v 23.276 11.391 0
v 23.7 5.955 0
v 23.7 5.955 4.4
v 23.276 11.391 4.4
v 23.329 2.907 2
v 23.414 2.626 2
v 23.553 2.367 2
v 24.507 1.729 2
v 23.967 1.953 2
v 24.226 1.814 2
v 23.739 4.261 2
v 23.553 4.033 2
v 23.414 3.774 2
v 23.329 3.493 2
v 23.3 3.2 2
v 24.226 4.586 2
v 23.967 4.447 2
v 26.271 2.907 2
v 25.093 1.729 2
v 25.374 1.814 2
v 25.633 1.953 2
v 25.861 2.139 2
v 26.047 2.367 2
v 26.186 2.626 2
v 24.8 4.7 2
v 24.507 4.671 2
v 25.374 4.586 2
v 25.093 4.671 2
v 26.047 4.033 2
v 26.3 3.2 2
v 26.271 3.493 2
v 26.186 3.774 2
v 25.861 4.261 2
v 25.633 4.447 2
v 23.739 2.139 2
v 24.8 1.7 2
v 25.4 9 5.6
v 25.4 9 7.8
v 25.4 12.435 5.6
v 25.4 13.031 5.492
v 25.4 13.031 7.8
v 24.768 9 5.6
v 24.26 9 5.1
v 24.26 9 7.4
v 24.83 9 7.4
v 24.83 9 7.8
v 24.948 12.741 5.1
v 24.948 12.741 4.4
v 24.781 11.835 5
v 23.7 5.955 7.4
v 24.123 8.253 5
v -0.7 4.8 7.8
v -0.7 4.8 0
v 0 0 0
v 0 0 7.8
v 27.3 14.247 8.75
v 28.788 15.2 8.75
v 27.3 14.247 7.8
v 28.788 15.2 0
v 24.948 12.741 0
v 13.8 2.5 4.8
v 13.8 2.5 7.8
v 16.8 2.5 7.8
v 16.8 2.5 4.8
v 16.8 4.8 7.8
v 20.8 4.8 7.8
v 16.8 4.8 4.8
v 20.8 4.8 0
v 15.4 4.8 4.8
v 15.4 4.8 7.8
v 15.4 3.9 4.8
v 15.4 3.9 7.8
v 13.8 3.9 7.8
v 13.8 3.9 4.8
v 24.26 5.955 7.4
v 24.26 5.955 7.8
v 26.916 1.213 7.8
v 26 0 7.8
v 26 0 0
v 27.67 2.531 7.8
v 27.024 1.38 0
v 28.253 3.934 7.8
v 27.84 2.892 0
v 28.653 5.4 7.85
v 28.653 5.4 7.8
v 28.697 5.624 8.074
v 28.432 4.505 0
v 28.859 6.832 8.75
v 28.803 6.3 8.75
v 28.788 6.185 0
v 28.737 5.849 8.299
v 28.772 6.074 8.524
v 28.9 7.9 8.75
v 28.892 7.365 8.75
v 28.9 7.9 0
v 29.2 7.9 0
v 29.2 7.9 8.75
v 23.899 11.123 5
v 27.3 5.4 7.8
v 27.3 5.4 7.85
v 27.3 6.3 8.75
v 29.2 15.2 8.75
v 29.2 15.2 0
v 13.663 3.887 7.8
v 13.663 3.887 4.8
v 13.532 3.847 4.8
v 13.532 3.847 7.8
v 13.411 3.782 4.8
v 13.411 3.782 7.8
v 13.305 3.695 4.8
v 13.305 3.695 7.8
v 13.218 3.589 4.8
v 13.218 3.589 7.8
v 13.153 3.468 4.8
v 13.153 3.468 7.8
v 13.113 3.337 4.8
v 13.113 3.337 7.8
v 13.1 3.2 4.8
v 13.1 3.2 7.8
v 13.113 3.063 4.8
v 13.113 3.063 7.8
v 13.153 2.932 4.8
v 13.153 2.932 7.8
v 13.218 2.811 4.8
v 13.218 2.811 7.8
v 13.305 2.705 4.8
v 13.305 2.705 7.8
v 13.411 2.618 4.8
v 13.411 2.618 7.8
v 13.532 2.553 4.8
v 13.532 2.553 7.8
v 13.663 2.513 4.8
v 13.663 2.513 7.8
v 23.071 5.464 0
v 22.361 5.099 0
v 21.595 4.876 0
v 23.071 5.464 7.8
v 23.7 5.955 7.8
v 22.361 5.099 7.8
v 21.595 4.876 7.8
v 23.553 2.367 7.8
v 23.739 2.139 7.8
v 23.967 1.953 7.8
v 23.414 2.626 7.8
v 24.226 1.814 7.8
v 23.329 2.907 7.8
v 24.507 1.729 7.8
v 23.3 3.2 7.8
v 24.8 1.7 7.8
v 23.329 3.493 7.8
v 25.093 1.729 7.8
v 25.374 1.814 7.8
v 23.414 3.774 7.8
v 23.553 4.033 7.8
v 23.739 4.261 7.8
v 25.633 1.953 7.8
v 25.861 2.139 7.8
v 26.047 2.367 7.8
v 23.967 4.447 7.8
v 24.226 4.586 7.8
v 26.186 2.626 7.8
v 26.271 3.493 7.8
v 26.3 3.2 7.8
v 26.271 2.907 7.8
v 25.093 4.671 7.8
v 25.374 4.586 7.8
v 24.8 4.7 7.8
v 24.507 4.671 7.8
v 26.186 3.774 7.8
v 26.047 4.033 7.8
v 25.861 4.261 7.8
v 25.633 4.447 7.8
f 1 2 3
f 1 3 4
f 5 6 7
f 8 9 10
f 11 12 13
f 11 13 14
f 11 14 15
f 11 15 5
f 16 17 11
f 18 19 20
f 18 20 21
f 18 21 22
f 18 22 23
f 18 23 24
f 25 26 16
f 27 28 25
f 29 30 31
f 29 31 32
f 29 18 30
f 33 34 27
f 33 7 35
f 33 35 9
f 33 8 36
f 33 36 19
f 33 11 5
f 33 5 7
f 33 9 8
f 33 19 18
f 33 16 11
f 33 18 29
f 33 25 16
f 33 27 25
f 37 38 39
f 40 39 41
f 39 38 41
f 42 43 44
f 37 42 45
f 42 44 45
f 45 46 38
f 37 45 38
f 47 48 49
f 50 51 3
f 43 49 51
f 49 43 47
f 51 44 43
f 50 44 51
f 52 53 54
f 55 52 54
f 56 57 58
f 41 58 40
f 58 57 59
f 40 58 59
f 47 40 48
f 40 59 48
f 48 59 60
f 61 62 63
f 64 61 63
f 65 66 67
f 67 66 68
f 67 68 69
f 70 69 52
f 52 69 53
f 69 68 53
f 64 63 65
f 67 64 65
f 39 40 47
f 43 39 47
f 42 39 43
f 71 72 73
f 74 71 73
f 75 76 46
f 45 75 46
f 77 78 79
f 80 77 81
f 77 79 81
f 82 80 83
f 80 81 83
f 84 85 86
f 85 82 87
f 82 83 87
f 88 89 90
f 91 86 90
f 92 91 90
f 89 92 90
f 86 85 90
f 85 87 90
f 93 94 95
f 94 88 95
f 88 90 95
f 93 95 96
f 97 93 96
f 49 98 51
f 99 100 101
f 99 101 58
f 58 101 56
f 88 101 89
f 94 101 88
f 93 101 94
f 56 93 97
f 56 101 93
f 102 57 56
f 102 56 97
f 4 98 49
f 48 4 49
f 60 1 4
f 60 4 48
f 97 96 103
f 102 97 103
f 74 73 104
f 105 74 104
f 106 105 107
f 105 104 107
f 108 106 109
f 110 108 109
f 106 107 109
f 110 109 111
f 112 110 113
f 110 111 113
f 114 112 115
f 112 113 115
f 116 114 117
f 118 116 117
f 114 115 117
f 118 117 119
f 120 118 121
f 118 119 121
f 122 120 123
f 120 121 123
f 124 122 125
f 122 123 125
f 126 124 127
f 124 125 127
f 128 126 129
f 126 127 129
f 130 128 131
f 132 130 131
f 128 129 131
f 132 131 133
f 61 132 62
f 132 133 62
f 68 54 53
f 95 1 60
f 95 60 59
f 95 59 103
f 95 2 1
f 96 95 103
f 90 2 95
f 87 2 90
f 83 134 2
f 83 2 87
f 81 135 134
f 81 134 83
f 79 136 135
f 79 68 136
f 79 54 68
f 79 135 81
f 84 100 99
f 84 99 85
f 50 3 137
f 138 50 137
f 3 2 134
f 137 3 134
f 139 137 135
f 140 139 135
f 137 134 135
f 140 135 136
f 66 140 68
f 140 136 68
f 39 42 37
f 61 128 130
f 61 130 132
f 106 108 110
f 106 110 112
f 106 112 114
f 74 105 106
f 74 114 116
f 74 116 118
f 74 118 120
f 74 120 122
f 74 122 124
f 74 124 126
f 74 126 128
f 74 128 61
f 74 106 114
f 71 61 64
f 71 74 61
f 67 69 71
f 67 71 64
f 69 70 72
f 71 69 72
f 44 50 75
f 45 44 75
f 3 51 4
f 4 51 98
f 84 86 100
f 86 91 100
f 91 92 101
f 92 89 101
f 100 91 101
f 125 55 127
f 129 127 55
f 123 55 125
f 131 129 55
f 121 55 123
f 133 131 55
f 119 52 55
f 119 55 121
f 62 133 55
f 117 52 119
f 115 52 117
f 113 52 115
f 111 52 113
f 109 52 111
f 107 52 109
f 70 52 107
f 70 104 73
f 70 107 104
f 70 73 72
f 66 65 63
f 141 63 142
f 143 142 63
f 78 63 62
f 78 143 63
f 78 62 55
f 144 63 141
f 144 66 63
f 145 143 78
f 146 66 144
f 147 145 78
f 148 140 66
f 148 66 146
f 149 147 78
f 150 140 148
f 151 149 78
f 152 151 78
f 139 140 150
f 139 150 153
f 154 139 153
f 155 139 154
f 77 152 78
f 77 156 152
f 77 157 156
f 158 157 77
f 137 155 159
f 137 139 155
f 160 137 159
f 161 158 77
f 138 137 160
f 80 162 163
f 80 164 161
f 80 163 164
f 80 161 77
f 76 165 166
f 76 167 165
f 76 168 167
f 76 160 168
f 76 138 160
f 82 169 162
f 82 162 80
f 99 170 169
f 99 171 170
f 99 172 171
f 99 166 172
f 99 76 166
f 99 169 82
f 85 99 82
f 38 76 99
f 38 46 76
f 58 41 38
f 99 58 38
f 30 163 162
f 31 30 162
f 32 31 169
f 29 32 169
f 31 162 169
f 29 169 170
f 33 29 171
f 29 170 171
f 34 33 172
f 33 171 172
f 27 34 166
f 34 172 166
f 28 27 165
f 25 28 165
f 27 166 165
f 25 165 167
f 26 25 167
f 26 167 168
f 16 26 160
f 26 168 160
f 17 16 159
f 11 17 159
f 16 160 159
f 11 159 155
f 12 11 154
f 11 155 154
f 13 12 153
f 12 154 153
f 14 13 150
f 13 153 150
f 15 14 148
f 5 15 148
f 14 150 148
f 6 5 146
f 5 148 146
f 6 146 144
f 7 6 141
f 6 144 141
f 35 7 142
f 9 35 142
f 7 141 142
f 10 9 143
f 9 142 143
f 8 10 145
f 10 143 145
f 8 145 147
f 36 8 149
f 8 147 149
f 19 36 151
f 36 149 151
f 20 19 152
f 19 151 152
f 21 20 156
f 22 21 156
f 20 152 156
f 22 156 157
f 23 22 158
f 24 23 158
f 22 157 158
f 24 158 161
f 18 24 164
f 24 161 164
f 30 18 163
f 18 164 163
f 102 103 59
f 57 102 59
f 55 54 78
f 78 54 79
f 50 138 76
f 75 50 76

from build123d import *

# Parameters (mm, degrees)
F1_DEPTH  = 8.9
F2_W      = 28
F2_H      = 24.8338975774
F3_DEPTH  = 1.1
F4_W      = 81.2477835059
F4_H      = 5
F5_DEPTH  = 1.1
F6_R      = 1.5
F7_DEPTH  = 5.8
F8_W      = 8.6927097291
F8_H      = 13.0551015027
F9_DEPTH  = 0.15
F10_SIZE  = 0.9
F12_DEPTH = 3
F13_W     = 2.2015041194
F13_H     = 6.2
F14_DEPTH = 2.2
F15_SIZE  = 0.5
F17_DEPTH = 0.4
F19_DEPTH = 25
F21_DEPTH = 5
F22_SIZE  = 0.6


with BuildPart() as f1:
    # F0 (on Top) → F1 (new body)
    with BuildSketch(Plane.XY):
        with BuildLine():
            Line((-0.7, 4.8), (0, 0))
            Line((0, 0), (26, 0))
            ThreePointArc((26, 0), (28.1652277476, 3.687448042), (28.9, 7.9))
            Line((28.9, 7.9), (29.2, 7.9))
            Line((29.2, 7.9), (29.2, 15.2))
            Line((29.2, 15.2), (25.4, 15.2))
            Line((25.4, 15.2), (23.7, 5.9550013521))
            ThreePointArc((23.7, 5.9550013521), (22.3607712936, 5.0993739442), (20.8, 4.8))
            Line((20.8, 4.8), (-0.7, 4.8))
        make_face()
    extrude(amount=F1_DEPTH)

    # F2 (on face) → F3 (cut)
    with BuildSketch(Plane.XY.offset(8.9)):
        with Locations((13.3, 4.3441619959)):
            Rectangle(F2_W, F2_H)
    extrude(amount=-F3_DEPTH, mode=Mode.SUBTRACT)

    # F4 (on face) → F5 (cut)
    with BuildSketch(Plane.XY.offset(8.9)):
        with Locations((26.3764131814, 2.9)):
            Rectangle(F4_W, F4_H)
    extrude(amount=-F5_DEPTH, mode=Mode.SUBTRACT)

    # F6 (on face) → F7 (cut)
    with BuildSketch(Plane.XY.offset(7.8)):
        with Locations((24.8, 3.2)):
            Circle(F6_R)
    extrude(amount=-F7_DEPTH, mode=Mode.SUBTRACT)

    # F8 (on face) → F9 (cut)
    with BuildSketch(Plane.XY.offset(8.9)):
        with Locations((28.8734519854, 10.3571598884)):
            Rectangle(F8_W, F8_H)
    extrude(amount=-F9_DEPTH, mode=Mode.SUBTRACT)

    # F10
    f10_edges = [f1.edges().sort_by_distance(p)[0] for p in [
        (27.976572, 5.4, 8.75),
    ]]
    chamfer(f10_edges, length=F10_SIZE)

    # F11 (on face) → F12 (cut)
    with BuildSketch(Plane.XY.offset(7.8)):
        with BuildLine():
            ThreePointArc((13.8, 2.5), (14.2949747468, 2.7050252532), (14.5, 3.2))
            ThreePointArc((14.5, 3.2), (14.2949747468, 3.6949747468), (13.8, 3.9))
            ThreePointArc((13.8, 3.9), (13.1, 3.2), (13.8, 2.5))
        make_face()
        with BuildLine():
            ThreePointArc((13.8, 3.9), (14.2949747468, 3.6949747468), (14.5, 3.2))
            ThreePointArc((14.5, 3.2), (14.2949747468, 2.7050252532), (13.8, 2.5))
            Line((13.8, 2.5), (16.8, 2.5))
            Line((16.8, 2.5), (16.8, 4.8))
            Line((16.8, 4.8), (15.4, 4.8))
            Line((15.4, 4.8), (15.4, 3.9))
            Line((15.4, 3.9), (13.8, 3.9))
        make_face()
    extrude(amount=-F12_DEPTH, mode=Mode.SUBTRACT)

    # F13 (on face) → F14 (cut)
    with BuildSketch(Plane.XY.offset(7.8)):
        with Locations((24.2992479403, 12.1)):
            Rectangle(F13_W, F13_H)
    extrude(amount=-F14_DEPTH, mode=Mode.SUBTRACT)

    # F15
    f15_edges = [f1.edges().sort_by_distance(p)[0] for p in [
        (24.829962, 12.1, 5.6),
    ]]
    chamfer(f15_edges, length=F15_SIZE)

    # F16 (on face) → F17 (cut)
    with BuildSketch(Plane.XY.offset(7.8)):
        Polygon((24.8299620583, 9), (24.2599241167, 9), (23.7, 5.9550013521), (24.2599241167, 5.9550013521), align=None)
    extrude(amount=-F17_DEPTH, mode=Mode.SUBTRACT)

    # F18 (on face) → F19 (cut)
    with BuildSketch(Plane(origin=(0, 0, 0), x_dir=(1, 0, 0), z_dir=(0, 0, -1))):
        Polygon((28.7879798561, -15.2), (24.9478723404, -12.7412237639), (25.4, -15.2), align=None)
    extrude(amount=-F19_DEPTH, mode=Mode.SUBTRACT)

    # F20 (on face) → F21 (join)
    with BuildSketch(Plane(origin=(0, 0, 0), x_dir=(1, 0, 0), z_dir=(0, 0, -1))):
        Polygon((23.2760720335, -11.3907581303), (24.9478723404, -12.7412237639), (23.7, -5.9550013521), align=None)
    extrude(amount=-F21_DEPTH)

    # F22
    f22_edges = [f1.edges().sort_by_distance(p)[0] for p in [
        (23.488036, 8.67288, 5),
        (24.111972, 12.065991, 5),
    ]]
    chamfer(f22_edges, length=F22_SIZE)


solid = f1.part
